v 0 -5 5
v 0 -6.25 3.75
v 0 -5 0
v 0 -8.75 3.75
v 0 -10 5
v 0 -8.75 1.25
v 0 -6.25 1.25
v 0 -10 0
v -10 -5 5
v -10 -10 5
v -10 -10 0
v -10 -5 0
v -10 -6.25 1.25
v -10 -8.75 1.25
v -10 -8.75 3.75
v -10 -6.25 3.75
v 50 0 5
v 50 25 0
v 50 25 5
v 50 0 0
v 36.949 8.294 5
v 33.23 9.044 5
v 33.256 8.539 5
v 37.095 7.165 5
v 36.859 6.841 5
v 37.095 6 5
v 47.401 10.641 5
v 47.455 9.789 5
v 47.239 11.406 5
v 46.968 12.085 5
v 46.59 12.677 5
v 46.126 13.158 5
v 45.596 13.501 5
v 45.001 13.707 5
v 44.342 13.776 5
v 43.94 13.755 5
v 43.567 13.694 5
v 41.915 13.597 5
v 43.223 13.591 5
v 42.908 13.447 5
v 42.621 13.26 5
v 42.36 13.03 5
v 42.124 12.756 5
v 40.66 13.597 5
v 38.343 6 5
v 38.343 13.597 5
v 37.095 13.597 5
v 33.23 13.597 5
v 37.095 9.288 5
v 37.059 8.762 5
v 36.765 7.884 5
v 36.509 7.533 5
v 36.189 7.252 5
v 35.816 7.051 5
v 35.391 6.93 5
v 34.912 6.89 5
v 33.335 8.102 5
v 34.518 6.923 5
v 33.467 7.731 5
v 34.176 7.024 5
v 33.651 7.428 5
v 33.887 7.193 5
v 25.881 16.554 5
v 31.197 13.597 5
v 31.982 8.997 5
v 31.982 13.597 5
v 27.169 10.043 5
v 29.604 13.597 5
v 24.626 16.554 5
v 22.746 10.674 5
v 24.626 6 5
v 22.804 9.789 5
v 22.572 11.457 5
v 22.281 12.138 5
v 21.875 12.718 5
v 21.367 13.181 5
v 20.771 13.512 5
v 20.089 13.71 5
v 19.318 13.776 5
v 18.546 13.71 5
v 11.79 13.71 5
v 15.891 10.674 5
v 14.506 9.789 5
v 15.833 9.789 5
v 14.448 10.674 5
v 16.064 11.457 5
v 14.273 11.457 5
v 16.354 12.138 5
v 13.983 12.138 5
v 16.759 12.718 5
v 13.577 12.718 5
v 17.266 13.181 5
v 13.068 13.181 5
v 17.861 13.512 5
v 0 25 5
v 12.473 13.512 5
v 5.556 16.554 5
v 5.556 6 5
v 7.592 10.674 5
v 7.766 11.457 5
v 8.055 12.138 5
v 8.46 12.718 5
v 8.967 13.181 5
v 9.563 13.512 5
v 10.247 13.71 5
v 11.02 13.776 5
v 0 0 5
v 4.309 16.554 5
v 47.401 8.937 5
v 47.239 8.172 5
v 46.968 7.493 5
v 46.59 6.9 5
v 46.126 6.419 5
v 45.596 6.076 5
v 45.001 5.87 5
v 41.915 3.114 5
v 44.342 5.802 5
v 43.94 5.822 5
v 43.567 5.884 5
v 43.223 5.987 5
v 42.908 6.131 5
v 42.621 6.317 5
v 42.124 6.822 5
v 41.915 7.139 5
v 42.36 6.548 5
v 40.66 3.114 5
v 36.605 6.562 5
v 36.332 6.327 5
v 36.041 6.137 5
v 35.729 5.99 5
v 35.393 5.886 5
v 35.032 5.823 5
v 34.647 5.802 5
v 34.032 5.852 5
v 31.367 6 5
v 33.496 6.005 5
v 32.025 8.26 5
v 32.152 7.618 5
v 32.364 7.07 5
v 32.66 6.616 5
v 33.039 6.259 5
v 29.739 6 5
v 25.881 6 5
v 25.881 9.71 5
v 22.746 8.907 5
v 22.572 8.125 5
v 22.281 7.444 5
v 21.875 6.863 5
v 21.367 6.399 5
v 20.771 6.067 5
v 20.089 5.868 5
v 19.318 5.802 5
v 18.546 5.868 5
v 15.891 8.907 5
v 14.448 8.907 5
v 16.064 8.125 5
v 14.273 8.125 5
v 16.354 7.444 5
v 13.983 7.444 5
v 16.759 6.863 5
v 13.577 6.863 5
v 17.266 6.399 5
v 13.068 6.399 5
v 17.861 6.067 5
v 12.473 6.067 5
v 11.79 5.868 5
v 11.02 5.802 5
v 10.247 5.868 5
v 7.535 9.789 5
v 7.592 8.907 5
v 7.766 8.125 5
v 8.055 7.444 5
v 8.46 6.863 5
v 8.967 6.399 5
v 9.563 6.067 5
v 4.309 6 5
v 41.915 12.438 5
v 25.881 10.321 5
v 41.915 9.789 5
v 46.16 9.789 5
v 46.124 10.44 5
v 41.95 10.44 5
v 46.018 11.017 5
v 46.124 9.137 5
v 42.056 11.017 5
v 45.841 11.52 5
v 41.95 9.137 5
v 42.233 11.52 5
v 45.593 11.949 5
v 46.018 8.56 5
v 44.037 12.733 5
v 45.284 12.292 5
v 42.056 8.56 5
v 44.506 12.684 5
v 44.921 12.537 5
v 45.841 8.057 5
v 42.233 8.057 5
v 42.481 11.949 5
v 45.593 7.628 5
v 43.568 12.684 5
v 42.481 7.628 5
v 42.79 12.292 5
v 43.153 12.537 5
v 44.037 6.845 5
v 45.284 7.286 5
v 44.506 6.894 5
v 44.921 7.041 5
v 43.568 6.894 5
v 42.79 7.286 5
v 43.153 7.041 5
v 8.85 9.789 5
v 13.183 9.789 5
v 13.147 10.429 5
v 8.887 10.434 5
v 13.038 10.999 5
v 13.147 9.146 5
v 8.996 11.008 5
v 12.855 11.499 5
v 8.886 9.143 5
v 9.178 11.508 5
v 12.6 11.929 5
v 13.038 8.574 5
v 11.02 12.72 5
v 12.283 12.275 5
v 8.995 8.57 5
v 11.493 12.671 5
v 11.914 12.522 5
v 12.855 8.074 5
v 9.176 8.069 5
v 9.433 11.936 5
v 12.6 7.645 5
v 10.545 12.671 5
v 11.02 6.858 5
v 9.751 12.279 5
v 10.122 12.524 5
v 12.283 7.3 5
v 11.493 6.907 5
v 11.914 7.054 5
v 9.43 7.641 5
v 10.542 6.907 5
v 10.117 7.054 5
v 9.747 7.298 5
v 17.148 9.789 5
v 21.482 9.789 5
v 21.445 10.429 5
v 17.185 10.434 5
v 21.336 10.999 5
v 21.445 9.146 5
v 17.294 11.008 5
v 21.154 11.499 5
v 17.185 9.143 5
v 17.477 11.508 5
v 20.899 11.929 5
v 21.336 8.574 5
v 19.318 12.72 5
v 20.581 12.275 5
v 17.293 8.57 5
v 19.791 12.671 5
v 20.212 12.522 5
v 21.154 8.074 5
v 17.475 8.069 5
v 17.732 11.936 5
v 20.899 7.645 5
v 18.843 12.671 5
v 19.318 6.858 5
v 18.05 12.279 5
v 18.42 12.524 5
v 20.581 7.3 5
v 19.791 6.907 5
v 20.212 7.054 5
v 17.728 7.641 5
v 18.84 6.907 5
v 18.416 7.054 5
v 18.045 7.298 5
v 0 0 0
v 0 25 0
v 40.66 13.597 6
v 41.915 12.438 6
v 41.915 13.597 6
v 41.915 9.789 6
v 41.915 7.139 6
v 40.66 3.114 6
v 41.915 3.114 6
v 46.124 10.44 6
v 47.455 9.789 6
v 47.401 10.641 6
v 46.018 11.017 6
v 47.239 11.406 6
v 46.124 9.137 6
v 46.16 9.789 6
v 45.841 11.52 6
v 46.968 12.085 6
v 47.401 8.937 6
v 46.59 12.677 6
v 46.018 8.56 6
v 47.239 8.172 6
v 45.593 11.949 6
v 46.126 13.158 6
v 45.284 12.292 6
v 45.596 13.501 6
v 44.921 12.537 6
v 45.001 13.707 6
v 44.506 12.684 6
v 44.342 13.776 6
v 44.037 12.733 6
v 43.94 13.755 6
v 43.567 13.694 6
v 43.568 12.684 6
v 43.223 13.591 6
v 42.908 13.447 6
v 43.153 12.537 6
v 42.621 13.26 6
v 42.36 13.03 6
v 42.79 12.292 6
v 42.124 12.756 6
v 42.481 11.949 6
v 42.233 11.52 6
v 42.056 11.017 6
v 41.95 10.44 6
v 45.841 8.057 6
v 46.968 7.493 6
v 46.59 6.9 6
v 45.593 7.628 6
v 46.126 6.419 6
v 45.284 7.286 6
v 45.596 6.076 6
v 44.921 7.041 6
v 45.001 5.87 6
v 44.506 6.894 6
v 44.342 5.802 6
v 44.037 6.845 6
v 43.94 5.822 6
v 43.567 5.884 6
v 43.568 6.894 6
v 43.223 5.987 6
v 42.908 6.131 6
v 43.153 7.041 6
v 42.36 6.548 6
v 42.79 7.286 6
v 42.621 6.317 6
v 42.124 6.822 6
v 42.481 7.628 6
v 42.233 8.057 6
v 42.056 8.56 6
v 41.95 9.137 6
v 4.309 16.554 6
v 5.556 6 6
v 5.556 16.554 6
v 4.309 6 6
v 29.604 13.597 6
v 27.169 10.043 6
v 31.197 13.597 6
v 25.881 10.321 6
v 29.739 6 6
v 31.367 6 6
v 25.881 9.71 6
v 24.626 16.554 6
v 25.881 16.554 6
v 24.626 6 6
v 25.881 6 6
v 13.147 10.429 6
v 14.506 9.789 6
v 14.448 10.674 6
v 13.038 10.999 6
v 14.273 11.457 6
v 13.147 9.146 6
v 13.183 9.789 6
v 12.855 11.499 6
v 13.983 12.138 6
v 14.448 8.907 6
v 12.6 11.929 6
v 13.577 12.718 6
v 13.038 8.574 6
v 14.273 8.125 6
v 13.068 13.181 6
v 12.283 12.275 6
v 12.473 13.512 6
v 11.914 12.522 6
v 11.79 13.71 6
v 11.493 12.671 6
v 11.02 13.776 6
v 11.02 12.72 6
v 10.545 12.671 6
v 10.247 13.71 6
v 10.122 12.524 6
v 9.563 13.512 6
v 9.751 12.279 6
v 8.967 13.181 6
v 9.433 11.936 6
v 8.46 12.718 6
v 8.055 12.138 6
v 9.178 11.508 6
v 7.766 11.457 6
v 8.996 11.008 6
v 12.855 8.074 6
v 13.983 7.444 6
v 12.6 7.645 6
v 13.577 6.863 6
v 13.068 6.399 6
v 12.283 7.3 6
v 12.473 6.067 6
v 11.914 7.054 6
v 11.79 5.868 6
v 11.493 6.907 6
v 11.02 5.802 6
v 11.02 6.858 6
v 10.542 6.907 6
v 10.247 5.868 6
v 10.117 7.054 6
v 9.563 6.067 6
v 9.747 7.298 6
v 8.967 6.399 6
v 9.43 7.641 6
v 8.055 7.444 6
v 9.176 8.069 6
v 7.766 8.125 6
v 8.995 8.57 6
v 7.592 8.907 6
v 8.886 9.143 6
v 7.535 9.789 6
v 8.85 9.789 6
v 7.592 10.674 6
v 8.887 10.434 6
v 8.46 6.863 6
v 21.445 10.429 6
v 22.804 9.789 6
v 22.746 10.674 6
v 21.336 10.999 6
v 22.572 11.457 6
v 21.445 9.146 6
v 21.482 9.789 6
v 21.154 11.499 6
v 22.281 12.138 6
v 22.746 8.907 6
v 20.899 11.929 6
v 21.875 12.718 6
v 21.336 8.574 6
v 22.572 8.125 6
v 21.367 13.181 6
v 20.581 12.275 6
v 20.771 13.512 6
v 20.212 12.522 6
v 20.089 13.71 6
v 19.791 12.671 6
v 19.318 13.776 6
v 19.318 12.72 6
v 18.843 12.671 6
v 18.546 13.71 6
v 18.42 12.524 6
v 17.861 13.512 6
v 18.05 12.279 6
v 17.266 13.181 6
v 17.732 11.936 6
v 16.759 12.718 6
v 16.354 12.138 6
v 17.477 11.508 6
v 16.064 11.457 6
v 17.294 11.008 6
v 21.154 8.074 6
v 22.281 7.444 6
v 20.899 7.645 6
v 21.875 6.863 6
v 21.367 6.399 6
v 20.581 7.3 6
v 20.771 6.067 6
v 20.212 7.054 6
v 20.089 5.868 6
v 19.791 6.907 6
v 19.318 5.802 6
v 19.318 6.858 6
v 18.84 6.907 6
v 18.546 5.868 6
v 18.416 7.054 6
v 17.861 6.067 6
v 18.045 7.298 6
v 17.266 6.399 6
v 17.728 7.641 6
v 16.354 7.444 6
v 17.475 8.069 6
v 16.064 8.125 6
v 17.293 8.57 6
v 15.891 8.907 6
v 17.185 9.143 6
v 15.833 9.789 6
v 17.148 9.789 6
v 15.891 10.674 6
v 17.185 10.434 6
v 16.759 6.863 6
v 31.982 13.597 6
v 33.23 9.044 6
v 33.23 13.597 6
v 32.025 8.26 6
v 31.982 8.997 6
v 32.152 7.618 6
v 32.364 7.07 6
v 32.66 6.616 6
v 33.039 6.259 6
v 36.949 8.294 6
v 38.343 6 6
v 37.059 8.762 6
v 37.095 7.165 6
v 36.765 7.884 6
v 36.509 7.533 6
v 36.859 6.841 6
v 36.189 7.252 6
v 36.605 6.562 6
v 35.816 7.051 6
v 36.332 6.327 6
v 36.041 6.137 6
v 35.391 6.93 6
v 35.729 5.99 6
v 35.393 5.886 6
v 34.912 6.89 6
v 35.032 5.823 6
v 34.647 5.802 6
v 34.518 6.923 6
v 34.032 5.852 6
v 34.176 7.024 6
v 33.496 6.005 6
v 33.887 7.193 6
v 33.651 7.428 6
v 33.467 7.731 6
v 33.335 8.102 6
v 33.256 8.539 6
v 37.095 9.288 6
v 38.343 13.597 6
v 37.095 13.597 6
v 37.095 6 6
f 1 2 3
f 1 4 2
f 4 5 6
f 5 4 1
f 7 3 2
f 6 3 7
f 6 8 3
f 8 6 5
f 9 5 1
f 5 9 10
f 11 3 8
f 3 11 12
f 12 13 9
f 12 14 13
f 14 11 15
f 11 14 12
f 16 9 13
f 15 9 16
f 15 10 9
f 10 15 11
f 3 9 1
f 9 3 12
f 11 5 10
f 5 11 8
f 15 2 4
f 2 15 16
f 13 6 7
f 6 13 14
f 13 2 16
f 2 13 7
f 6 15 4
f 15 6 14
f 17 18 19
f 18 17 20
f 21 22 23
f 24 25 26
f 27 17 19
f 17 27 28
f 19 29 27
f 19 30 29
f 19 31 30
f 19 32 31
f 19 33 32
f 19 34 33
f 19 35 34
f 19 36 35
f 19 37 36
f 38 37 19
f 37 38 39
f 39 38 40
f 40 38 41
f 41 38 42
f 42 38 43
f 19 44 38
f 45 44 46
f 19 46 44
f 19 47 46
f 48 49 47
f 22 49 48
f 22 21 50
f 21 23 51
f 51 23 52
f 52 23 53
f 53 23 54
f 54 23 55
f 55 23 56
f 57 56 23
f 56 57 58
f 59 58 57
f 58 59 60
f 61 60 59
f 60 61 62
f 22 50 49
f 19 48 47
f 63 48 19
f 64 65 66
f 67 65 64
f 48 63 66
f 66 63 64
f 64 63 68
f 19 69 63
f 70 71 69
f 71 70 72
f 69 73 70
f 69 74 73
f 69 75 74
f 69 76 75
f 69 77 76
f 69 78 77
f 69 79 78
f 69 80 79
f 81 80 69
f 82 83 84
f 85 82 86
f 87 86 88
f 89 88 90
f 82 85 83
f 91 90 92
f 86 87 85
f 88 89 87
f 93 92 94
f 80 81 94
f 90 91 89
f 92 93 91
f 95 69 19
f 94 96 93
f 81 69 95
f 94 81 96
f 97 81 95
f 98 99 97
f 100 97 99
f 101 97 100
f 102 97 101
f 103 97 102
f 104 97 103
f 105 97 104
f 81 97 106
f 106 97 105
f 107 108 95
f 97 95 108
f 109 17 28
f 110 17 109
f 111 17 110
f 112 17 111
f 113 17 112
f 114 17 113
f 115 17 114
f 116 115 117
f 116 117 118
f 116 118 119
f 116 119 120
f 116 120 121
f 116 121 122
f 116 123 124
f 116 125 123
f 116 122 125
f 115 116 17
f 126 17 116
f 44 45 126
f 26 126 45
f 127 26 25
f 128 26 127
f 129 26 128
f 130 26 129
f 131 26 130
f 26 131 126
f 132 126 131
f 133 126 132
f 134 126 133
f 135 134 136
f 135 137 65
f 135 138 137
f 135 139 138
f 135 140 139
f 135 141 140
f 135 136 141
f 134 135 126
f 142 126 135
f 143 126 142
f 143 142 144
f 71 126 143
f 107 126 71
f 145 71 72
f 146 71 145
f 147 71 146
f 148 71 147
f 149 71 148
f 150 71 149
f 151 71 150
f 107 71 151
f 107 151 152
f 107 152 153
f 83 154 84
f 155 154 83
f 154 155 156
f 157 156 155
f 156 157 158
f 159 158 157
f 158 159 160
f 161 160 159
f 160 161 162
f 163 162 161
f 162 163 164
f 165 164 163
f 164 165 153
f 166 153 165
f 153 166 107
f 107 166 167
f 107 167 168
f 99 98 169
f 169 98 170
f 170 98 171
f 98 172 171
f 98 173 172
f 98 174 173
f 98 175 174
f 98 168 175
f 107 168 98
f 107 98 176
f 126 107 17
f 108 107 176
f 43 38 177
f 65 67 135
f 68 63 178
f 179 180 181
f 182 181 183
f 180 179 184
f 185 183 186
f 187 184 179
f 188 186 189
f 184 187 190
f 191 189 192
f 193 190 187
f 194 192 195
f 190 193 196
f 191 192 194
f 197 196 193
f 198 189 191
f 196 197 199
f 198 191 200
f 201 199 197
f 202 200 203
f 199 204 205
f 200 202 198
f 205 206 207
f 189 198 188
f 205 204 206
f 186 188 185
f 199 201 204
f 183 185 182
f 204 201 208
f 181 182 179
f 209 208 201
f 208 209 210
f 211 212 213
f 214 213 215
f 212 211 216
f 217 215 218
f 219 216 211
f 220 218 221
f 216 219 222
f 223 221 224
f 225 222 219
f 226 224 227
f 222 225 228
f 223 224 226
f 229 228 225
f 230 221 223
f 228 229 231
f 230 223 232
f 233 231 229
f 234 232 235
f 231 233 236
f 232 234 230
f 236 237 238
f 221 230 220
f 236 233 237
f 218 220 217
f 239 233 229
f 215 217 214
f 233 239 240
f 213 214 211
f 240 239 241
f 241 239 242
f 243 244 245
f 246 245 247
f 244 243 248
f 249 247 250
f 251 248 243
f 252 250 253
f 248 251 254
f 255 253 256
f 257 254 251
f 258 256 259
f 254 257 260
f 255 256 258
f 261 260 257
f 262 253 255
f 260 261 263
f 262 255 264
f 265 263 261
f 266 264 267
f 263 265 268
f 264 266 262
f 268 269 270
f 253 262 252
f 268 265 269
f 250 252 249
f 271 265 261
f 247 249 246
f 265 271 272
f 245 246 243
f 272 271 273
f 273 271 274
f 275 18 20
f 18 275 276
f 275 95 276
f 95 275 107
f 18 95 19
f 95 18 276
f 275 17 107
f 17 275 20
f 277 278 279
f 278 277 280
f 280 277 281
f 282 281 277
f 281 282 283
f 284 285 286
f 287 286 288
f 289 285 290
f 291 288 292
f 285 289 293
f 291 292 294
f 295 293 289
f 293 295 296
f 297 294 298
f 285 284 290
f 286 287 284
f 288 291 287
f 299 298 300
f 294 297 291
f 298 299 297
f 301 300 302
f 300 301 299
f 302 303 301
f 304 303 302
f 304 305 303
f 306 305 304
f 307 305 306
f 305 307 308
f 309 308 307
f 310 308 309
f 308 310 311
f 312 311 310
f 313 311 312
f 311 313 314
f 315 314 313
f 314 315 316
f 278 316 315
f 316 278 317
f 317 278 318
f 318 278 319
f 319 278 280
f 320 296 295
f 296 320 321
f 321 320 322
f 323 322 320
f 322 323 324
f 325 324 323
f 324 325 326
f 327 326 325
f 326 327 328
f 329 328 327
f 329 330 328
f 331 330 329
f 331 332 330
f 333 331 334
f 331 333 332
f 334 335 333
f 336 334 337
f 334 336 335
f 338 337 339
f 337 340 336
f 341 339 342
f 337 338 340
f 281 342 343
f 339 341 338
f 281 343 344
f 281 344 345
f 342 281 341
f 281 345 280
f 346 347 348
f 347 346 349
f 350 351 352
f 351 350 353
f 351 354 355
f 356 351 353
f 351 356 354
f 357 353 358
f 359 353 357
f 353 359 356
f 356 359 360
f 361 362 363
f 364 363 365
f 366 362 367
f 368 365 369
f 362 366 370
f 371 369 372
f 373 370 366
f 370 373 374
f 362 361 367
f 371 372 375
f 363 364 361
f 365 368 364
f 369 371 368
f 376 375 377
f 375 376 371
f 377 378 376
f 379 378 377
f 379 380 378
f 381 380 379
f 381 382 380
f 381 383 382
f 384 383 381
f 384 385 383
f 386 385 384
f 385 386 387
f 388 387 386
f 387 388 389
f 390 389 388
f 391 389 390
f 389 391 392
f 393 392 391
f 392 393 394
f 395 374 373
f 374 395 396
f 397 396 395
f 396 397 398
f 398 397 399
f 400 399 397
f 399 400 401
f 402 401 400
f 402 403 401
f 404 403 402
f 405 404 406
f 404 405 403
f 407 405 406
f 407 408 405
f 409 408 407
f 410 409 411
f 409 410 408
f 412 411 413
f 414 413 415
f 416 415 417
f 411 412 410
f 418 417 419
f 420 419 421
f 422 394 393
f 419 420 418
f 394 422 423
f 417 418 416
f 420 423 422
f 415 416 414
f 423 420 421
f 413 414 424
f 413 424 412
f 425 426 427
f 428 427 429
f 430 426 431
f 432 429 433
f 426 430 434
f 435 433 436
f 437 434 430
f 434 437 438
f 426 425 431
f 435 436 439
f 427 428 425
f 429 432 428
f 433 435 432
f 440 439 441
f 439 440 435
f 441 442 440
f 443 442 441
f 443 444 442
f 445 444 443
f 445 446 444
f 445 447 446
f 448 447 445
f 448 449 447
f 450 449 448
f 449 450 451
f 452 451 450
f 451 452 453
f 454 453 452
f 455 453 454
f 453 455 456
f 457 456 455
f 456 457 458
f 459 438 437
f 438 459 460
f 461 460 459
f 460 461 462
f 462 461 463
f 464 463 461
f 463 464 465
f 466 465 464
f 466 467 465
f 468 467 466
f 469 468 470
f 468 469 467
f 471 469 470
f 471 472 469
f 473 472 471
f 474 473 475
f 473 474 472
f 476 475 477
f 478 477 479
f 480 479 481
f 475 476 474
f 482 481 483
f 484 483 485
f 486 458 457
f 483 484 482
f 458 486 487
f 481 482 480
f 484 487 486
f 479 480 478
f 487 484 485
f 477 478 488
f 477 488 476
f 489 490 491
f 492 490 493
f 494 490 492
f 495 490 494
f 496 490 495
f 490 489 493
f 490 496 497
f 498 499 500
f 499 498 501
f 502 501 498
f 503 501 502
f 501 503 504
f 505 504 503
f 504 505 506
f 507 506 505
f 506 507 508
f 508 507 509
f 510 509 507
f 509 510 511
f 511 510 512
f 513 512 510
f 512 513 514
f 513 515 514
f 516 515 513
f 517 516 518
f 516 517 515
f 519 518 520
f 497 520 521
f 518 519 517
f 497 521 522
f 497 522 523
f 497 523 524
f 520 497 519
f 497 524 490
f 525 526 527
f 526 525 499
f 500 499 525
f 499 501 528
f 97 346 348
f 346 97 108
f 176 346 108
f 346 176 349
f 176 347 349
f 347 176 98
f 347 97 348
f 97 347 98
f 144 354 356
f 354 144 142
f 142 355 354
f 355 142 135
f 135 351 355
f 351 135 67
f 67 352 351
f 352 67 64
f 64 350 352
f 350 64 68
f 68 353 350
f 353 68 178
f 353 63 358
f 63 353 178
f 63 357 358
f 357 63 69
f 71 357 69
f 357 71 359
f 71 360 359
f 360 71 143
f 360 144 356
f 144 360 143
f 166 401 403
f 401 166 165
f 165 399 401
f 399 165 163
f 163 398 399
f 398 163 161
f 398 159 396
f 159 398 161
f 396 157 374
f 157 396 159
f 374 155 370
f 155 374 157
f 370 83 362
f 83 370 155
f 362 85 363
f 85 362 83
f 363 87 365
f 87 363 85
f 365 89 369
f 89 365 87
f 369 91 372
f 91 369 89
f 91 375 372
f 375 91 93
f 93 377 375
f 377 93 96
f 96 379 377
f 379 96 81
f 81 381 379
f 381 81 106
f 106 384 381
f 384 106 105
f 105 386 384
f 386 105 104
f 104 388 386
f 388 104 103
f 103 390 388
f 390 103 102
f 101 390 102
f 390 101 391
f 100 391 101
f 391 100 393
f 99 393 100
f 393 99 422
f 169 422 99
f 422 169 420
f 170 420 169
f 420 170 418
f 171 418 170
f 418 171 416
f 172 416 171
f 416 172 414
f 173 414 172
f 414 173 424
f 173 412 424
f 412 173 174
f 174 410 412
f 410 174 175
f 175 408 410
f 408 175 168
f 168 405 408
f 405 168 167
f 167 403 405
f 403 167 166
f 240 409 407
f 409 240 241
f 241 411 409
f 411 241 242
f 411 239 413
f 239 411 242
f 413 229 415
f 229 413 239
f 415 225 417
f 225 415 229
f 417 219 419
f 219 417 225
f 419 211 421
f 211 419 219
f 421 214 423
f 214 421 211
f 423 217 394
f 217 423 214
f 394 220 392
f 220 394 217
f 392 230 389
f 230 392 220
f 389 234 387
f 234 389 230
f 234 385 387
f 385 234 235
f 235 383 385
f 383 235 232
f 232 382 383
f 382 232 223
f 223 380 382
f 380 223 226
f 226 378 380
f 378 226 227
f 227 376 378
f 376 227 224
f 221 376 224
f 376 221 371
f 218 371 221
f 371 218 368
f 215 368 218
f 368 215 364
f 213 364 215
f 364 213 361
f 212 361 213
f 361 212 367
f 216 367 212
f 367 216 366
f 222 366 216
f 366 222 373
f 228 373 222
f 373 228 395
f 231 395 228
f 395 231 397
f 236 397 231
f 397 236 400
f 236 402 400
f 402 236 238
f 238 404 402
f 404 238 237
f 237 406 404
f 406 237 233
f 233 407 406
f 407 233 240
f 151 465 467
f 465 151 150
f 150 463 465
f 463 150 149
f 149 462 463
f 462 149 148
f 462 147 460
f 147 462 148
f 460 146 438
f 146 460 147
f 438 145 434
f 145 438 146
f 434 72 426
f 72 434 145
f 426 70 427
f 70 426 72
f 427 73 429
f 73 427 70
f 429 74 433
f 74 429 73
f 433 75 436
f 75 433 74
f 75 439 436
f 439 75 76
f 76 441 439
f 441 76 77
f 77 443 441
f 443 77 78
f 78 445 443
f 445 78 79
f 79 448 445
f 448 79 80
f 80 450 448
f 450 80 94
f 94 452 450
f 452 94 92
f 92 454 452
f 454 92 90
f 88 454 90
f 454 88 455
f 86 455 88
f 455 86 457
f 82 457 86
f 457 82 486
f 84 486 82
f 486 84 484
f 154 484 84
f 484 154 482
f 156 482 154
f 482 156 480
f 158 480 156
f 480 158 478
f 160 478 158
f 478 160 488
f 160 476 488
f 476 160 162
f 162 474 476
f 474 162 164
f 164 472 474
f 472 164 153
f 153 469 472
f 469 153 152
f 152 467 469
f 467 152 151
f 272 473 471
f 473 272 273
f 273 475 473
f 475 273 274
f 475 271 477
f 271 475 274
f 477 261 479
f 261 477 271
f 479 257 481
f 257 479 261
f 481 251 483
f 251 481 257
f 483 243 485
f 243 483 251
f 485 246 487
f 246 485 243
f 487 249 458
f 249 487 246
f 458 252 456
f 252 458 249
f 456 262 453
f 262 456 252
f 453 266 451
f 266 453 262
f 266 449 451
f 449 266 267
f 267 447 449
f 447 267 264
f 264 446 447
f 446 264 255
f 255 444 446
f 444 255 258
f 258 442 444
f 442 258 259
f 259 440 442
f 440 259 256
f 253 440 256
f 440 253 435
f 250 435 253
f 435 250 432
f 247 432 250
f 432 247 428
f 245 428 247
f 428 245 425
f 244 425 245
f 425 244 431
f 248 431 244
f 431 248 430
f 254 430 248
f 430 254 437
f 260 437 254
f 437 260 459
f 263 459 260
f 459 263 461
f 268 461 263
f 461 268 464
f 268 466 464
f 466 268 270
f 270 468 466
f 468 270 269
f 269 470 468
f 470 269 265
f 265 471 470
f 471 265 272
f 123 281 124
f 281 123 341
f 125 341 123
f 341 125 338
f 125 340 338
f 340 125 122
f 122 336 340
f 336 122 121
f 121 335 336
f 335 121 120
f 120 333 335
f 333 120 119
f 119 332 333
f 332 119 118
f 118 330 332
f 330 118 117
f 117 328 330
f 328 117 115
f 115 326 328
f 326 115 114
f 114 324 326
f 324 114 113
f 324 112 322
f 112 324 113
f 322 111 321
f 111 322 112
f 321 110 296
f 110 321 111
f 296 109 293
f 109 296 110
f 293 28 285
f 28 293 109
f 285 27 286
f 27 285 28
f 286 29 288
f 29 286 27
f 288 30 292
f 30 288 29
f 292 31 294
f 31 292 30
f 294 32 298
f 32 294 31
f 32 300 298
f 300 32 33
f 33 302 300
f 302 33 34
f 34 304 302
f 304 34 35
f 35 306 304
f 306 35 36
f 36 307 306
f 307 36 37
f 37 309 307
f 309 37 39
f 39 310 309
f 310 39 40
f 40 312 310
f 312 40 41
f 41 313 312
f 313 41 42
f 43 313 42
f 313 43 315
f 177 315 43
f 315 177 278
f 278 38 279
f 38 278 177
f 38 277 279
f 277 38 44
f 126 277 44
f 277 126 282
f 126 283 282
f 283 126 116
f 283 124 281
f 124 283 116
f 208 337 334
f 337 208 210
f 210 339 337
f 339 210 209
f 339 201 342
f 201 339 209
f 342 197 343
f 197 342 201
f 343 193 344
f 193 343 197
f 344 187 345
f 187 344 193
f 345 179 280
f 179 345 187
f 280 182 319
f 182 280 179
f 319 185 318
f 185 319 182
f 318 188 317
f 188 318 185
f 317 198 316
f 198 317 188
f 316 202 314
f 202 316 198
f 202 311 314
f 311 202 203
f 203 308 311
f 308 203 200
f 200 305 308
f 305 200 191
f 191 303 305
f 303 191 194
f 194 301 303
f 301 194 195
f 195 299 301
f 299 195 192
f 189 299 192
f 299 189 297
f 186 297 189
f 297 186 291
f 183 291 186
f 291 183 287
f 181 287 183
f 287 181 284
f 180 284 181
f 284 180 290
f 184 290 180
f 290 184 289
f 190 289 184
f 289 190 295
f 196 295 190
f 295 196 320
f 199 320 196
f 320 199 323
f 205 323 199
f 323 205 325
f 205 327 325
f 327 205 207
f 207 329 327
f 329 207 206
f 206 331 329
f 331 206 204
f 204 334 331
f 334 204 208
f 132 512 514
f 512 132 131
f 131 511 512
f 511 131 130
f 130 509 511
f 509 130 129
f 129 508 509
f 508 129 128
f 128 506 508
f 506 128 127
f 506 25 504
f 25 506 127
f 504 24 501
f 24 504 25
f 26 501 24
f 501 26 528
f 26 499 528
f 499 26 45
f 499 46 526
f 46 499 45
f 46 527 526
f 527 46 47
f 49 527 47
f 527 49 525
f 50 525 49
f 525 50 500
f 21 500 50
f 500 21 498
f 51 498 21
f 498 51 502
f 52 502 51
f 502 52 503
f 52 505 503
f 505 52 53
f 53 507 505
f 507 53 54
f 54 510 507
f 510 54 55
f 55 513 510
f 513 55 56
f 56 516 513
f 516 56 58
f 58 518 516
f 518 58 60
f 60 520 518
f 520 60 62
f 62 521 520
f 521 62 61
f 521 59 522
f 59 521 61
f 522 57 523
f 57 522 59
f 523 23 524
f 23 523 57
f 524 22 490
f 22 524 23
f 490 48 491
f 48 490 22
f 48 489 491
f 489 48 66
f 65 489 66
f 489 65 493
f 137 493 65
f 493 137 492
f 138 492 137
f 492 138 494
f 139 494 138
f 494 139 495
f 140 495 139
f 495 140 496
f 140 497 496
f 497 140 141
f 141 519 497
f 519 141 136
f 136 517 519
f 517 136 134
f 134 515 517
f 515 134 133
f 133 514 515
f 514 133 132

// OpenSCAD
cube([50, 25, 5]);
translate([3, 6, 5]) {
  linear_extrude(height = 1) {
    text("lookup", font = "Noto Serif JP");
  }
}

translate([-10, -10, 0]) {
  difference () {
    cube([10, 5, 5]);
    translate([0, 1.25, 1.25]) {
      cube([11, 2.5, 2.5]);
    }
  }
}
